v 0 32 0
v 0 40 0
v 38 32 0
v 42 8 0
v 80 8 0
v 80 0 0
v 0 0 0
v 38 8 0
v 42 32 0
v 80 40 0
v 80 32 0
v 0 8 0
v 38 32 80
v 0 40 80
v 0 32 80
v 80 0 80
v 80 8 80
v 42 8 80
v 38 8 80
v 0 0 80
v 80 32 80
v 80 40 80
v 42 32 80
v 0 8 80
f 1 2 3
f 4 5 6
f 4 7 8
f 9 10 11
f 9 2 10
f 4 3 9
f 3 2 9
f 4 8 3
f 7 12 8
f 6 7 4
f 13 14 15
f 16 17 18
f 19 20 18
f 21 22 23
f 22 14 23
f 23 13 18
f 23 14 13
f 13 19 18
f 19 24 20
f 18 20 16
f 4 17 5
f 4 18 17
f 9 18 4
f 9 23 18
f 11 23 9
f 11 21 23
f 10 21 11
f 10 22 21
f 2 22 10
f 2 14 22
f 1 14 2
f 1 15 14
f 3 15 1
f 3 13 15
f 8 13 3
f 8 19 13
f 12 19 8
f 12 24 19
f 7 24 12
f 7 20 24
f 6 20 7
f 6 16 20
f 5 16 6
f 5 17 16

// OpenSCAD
$fn = 32;

// ----------------------------------------------------------------------
// Structural section: ibeam 80 x 40 mm
// ----------------------------------------------------------------------

// --- parameters (mm) ---
sec_w = 80;               // section width, X
sec_h = 40;               // section height, Y
flange_t = 8;             // flange thickness
web_t = 4;                // web thickness
plate_t = 80;             // cut length, Z (extrusion height)

profile = [[0, 0], [80, 0], [80, 8], [42, 8], [42, 32], [80, 32], [80, 40], [0, 40], [0, 32], [38, 32], [38, 8], [0, 8]];  // primary outline, 12 points, counter clockwise

// --- the one profile operation ---
linear_extrude(height = plate_t) polygon(points = profile);
